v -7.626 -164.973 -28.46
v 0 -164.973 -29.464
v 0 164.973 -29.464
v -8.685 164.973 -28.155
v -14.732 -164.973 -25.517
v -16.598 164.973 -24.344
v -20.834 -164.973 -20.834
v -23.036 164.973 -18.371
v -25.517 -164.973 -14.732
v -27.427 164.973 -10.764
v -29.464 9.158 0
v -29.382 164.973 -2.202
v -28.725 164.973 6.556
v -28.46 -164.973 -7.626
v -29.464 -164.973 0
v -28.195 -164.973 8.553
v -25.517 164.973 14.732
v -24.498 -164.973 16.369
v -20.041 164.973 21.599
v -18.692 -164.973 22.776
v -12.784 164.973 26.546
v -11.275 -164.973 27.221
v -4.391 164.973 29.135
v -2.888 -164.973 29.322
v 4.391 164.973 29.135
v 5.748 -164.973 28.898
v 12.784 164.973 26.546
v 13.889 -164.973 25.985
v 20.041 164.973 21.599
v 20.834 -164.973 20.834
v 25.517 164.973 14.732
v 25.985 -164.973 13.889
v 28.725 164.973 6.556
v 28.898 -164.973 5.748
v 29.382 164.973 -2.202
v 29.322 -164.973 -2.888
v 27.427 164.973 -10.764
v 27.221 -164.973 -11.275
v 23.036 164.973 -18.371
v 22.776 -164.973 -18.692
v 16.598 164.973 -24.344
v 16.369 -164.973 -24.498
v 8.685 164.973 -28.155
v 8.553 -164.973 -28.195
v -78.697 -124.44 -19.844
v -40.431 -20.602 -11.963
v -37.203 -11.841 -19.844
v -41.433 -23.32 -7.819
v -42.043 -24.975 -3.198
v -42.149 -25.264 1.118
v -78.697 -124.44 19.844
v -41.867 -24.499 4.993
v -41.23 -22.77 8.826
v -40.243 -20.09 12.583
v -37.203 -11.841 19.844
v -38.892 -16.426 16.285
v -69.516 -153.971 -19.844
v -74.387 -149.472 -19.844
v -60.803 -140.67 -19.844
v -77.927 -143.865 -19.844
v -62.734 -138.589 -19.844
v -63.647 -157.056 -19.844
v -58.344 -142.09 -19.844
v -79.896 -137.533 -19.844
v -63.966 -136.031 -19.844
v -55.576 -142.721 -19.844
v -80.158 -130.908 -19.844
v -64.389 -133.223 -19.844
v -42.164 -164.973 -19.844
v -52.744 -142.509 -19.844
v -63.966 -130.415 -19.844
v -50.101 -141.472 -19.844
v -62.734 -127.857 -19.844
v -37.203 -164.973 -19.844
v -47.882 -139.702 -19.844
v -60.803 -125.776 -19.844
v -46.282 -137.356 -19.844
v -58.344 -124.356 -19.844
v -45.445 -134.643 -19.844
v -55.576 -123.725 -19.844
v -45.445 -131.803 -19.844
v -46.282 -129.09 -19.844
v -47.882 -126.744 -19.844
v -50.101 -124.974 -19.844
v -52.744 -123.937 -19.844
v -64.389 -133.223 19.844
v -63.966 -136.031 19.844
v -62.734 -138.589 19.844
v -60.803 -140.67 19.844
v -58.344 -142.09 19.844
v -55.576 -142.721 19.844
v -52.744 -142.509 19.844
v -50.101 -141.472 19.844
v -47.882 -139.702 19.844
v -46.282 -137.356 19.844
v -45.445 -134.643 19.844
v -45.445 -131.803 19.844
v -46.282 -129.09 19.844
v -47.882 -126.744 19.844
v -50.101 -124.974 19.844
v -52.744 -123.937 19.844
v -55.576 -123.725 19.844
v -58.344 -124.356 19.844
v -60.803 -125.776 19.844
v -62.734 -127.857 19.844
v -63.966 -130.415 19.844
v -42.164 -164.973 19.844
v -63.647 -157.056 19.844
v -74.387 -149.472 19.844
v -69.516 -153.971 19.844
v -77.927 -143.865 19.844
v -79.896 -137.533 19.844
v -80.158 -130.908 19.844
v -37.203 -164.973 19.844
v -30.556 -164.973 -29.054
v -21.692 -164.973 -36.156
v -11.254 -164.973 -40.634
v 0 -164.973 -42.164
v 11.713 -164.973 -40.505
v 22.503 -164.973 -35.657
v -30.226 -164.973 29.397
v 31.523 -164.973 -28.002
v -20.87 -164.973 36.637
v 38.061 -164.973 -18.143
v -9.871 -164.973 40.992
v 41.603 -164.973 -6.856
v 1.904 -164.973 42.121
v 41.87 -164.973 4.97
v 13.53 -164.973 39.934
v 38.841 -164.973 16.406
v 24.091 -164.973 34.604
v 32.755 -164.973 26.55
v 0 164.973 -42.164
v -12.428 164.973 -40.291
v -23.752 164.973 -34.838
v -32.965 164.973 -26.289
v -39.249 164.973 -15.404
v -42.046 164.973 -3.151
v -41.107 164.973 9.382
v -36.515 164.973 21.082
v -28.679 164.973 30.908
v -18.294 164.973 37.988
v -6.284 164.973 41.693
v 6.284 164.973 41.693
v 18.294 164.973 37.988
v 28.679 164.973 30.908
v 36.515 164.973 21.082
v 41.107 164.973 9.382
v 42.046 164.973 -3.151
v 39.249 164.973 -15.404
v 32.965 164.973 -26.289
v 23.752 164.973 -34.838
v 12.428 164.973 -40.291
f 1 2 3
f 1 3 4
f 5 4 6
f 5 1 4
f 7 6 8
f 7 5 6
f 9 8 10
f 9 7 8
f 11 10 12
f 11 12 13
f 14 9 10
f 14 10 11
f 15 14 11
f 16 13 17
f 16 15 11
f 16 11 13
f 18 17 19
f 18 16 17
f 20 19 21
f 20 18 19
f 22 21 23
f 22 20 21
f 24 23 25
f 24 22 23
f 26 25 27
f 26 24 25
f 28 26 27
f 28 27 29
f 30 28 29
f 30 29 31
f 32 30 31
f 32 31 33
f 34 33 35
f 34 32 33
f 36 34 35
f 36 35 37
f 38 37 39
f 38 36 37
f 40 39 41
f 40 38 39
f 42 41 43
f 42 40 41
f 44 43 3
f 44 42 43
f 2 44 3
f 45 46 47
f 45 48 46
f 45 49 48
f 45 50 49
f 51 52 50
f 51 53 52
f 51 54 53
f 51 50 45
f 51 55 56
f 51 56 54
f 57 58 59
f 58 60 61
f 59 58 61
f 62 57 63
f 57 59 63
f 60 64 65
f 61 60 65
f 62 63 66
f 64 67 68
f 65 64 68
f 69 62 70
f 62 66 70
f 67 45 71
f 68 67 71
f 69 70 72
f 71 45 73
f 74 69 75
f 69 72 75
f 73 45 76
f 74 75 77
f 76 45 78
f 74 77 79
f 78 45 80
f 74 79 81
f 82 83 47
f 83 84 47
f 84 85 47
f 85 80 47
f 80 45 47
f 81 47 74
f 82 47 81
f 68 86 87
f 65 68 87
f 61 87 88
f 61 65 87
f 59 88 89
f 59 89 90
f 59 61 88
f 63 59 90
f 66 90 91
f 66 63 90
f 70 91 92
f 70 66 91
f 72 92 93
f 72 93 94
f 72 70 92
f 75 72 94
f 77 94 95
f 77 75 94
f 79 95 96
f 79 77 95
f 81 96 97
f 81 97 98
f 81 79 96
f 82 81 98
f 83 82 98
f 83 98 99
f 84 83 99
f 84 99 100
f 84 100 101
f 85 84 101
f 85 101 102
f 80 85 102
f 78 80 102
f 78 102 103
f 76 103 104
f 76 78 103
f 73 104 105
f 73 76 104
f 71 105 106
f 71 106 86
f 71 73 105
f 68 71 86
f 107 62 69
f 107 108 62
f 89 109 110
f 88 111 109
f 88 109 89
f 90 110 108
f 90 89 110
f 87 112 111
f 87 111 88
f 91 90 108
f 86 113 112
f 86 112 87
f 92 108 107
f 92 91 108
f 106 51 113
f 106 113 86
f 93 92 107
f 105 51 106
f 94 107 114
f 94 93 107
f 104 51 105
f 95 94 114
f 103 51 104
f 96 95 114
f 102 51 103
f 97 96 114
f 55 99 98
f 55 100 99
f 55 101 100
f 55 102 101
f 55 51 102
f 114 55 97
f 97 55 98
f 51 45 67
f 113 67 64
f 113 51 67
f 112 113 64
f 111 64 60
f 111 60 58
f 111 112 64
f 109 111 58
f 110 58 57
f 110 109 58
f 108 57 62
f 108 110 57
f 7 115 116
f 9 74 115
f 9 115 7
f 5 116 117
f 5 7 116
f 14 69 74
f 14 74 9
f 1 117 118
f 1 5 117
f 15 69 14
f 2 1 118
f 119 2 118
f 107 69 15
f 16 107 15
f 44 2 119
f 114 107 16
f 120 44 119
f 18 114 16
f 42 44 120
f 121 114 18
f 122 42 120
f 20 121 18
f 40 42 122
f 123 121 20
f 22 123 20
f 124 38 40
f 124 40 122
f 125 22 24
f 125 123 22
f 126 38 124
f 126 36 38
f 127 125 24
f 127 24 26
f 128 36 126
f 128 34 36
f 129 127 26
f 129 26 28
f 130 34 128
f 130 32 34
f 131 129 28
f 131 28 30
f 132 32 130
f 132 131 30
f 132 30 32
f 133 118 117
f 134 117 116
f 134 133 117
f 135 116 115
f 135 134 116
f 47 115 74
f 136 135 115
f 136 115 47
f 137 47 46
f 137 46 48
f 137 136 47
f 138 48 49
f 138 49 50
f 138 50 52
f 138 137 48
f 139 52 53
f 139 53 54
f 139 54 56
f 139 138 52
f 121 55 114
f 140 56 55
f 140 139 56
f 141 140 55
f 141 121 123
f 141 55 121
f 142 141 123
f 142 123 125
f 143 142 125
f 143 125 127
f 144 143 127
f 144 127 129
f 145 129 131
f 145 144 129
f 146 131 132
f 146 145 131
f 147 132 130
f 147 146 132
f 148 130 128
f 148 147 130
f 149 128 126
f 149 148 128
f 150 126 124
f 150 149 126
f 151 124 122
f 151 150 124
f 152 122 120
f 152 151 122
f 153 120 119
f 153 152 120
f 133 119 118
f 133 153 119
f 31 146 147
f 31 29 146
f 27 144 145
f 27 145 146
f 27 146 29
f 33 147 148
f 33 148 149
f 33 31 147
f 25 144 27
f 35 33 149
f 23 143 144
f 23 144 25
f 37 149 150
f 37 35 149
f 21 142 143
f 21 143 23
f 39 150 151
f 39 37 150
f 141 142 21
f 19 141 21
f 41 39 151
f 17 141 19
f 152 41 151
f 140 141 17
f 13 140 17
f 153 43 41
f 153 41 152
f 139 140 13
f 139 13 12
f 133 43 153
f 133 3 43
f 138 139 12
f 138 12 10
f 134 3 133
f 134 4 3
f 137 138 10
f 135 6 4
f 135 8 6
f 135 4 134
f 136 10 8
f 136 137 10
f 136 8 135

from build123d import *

# Parameters (mm, degrees)
SKETCH1_R           = 42.164
SKETCH1_R_2         = 29.464
BOSS_EXTRUDE1_DEPTH = 164.973
SKETCH2_R           = 9.525
BOSS_EXTRUDE2_DEPTH = 19.84375


with BuildPart() as part:
    # Sketch1 → Boss-Extrude1 (new, symmetric)
    with BuildSketch(Plane(origin=(0, 0, 0), x_dir=(1, 0, 0), z_dir=(0, 1, 0))):
        with Locations(Location((0, 0, 0), (0, 0, 90))):
            Circle(SKETCH1_R)
        with Locations(Location((0, 0, 0), (0, 0, 90))):
            Circle(SKETCH1_R_2, mode=Mode.SUBTRACT)
    extrude(amount=BOSS_EXTRUDE1_DEPTH, both=True)

    # Sketch2 → Boss-Extrude2 (add, symmetric)
    with BuildSketch(Plane.XY):
        with BuildLine():
            Line((-63.646931448, -157.056172579), (-42.164, -164.973))
            Line((-42.164, -164.973), (-29.464, -164.973))
            Line((-29.464, -164.973), (-29.464, 9.158002397))
            Line((-29.464, 9.158002397), (-78.697172579, -124.440068552))
            ThreePointArc((-78.697172579, -124.440068552), (-77.927068333, -143.865127562), (-63.646931448, -157.056172579))
        make_face()
        with Locations(Location((-54.864, -133.223, 0), (0, 0, 180))):
            Circle(SKETCH2_R, mode=Mode.SUBTRACT)
    extrude(amount=BOSS_EXTRUDE2_DEPTH, both=True)


solid = part.part
